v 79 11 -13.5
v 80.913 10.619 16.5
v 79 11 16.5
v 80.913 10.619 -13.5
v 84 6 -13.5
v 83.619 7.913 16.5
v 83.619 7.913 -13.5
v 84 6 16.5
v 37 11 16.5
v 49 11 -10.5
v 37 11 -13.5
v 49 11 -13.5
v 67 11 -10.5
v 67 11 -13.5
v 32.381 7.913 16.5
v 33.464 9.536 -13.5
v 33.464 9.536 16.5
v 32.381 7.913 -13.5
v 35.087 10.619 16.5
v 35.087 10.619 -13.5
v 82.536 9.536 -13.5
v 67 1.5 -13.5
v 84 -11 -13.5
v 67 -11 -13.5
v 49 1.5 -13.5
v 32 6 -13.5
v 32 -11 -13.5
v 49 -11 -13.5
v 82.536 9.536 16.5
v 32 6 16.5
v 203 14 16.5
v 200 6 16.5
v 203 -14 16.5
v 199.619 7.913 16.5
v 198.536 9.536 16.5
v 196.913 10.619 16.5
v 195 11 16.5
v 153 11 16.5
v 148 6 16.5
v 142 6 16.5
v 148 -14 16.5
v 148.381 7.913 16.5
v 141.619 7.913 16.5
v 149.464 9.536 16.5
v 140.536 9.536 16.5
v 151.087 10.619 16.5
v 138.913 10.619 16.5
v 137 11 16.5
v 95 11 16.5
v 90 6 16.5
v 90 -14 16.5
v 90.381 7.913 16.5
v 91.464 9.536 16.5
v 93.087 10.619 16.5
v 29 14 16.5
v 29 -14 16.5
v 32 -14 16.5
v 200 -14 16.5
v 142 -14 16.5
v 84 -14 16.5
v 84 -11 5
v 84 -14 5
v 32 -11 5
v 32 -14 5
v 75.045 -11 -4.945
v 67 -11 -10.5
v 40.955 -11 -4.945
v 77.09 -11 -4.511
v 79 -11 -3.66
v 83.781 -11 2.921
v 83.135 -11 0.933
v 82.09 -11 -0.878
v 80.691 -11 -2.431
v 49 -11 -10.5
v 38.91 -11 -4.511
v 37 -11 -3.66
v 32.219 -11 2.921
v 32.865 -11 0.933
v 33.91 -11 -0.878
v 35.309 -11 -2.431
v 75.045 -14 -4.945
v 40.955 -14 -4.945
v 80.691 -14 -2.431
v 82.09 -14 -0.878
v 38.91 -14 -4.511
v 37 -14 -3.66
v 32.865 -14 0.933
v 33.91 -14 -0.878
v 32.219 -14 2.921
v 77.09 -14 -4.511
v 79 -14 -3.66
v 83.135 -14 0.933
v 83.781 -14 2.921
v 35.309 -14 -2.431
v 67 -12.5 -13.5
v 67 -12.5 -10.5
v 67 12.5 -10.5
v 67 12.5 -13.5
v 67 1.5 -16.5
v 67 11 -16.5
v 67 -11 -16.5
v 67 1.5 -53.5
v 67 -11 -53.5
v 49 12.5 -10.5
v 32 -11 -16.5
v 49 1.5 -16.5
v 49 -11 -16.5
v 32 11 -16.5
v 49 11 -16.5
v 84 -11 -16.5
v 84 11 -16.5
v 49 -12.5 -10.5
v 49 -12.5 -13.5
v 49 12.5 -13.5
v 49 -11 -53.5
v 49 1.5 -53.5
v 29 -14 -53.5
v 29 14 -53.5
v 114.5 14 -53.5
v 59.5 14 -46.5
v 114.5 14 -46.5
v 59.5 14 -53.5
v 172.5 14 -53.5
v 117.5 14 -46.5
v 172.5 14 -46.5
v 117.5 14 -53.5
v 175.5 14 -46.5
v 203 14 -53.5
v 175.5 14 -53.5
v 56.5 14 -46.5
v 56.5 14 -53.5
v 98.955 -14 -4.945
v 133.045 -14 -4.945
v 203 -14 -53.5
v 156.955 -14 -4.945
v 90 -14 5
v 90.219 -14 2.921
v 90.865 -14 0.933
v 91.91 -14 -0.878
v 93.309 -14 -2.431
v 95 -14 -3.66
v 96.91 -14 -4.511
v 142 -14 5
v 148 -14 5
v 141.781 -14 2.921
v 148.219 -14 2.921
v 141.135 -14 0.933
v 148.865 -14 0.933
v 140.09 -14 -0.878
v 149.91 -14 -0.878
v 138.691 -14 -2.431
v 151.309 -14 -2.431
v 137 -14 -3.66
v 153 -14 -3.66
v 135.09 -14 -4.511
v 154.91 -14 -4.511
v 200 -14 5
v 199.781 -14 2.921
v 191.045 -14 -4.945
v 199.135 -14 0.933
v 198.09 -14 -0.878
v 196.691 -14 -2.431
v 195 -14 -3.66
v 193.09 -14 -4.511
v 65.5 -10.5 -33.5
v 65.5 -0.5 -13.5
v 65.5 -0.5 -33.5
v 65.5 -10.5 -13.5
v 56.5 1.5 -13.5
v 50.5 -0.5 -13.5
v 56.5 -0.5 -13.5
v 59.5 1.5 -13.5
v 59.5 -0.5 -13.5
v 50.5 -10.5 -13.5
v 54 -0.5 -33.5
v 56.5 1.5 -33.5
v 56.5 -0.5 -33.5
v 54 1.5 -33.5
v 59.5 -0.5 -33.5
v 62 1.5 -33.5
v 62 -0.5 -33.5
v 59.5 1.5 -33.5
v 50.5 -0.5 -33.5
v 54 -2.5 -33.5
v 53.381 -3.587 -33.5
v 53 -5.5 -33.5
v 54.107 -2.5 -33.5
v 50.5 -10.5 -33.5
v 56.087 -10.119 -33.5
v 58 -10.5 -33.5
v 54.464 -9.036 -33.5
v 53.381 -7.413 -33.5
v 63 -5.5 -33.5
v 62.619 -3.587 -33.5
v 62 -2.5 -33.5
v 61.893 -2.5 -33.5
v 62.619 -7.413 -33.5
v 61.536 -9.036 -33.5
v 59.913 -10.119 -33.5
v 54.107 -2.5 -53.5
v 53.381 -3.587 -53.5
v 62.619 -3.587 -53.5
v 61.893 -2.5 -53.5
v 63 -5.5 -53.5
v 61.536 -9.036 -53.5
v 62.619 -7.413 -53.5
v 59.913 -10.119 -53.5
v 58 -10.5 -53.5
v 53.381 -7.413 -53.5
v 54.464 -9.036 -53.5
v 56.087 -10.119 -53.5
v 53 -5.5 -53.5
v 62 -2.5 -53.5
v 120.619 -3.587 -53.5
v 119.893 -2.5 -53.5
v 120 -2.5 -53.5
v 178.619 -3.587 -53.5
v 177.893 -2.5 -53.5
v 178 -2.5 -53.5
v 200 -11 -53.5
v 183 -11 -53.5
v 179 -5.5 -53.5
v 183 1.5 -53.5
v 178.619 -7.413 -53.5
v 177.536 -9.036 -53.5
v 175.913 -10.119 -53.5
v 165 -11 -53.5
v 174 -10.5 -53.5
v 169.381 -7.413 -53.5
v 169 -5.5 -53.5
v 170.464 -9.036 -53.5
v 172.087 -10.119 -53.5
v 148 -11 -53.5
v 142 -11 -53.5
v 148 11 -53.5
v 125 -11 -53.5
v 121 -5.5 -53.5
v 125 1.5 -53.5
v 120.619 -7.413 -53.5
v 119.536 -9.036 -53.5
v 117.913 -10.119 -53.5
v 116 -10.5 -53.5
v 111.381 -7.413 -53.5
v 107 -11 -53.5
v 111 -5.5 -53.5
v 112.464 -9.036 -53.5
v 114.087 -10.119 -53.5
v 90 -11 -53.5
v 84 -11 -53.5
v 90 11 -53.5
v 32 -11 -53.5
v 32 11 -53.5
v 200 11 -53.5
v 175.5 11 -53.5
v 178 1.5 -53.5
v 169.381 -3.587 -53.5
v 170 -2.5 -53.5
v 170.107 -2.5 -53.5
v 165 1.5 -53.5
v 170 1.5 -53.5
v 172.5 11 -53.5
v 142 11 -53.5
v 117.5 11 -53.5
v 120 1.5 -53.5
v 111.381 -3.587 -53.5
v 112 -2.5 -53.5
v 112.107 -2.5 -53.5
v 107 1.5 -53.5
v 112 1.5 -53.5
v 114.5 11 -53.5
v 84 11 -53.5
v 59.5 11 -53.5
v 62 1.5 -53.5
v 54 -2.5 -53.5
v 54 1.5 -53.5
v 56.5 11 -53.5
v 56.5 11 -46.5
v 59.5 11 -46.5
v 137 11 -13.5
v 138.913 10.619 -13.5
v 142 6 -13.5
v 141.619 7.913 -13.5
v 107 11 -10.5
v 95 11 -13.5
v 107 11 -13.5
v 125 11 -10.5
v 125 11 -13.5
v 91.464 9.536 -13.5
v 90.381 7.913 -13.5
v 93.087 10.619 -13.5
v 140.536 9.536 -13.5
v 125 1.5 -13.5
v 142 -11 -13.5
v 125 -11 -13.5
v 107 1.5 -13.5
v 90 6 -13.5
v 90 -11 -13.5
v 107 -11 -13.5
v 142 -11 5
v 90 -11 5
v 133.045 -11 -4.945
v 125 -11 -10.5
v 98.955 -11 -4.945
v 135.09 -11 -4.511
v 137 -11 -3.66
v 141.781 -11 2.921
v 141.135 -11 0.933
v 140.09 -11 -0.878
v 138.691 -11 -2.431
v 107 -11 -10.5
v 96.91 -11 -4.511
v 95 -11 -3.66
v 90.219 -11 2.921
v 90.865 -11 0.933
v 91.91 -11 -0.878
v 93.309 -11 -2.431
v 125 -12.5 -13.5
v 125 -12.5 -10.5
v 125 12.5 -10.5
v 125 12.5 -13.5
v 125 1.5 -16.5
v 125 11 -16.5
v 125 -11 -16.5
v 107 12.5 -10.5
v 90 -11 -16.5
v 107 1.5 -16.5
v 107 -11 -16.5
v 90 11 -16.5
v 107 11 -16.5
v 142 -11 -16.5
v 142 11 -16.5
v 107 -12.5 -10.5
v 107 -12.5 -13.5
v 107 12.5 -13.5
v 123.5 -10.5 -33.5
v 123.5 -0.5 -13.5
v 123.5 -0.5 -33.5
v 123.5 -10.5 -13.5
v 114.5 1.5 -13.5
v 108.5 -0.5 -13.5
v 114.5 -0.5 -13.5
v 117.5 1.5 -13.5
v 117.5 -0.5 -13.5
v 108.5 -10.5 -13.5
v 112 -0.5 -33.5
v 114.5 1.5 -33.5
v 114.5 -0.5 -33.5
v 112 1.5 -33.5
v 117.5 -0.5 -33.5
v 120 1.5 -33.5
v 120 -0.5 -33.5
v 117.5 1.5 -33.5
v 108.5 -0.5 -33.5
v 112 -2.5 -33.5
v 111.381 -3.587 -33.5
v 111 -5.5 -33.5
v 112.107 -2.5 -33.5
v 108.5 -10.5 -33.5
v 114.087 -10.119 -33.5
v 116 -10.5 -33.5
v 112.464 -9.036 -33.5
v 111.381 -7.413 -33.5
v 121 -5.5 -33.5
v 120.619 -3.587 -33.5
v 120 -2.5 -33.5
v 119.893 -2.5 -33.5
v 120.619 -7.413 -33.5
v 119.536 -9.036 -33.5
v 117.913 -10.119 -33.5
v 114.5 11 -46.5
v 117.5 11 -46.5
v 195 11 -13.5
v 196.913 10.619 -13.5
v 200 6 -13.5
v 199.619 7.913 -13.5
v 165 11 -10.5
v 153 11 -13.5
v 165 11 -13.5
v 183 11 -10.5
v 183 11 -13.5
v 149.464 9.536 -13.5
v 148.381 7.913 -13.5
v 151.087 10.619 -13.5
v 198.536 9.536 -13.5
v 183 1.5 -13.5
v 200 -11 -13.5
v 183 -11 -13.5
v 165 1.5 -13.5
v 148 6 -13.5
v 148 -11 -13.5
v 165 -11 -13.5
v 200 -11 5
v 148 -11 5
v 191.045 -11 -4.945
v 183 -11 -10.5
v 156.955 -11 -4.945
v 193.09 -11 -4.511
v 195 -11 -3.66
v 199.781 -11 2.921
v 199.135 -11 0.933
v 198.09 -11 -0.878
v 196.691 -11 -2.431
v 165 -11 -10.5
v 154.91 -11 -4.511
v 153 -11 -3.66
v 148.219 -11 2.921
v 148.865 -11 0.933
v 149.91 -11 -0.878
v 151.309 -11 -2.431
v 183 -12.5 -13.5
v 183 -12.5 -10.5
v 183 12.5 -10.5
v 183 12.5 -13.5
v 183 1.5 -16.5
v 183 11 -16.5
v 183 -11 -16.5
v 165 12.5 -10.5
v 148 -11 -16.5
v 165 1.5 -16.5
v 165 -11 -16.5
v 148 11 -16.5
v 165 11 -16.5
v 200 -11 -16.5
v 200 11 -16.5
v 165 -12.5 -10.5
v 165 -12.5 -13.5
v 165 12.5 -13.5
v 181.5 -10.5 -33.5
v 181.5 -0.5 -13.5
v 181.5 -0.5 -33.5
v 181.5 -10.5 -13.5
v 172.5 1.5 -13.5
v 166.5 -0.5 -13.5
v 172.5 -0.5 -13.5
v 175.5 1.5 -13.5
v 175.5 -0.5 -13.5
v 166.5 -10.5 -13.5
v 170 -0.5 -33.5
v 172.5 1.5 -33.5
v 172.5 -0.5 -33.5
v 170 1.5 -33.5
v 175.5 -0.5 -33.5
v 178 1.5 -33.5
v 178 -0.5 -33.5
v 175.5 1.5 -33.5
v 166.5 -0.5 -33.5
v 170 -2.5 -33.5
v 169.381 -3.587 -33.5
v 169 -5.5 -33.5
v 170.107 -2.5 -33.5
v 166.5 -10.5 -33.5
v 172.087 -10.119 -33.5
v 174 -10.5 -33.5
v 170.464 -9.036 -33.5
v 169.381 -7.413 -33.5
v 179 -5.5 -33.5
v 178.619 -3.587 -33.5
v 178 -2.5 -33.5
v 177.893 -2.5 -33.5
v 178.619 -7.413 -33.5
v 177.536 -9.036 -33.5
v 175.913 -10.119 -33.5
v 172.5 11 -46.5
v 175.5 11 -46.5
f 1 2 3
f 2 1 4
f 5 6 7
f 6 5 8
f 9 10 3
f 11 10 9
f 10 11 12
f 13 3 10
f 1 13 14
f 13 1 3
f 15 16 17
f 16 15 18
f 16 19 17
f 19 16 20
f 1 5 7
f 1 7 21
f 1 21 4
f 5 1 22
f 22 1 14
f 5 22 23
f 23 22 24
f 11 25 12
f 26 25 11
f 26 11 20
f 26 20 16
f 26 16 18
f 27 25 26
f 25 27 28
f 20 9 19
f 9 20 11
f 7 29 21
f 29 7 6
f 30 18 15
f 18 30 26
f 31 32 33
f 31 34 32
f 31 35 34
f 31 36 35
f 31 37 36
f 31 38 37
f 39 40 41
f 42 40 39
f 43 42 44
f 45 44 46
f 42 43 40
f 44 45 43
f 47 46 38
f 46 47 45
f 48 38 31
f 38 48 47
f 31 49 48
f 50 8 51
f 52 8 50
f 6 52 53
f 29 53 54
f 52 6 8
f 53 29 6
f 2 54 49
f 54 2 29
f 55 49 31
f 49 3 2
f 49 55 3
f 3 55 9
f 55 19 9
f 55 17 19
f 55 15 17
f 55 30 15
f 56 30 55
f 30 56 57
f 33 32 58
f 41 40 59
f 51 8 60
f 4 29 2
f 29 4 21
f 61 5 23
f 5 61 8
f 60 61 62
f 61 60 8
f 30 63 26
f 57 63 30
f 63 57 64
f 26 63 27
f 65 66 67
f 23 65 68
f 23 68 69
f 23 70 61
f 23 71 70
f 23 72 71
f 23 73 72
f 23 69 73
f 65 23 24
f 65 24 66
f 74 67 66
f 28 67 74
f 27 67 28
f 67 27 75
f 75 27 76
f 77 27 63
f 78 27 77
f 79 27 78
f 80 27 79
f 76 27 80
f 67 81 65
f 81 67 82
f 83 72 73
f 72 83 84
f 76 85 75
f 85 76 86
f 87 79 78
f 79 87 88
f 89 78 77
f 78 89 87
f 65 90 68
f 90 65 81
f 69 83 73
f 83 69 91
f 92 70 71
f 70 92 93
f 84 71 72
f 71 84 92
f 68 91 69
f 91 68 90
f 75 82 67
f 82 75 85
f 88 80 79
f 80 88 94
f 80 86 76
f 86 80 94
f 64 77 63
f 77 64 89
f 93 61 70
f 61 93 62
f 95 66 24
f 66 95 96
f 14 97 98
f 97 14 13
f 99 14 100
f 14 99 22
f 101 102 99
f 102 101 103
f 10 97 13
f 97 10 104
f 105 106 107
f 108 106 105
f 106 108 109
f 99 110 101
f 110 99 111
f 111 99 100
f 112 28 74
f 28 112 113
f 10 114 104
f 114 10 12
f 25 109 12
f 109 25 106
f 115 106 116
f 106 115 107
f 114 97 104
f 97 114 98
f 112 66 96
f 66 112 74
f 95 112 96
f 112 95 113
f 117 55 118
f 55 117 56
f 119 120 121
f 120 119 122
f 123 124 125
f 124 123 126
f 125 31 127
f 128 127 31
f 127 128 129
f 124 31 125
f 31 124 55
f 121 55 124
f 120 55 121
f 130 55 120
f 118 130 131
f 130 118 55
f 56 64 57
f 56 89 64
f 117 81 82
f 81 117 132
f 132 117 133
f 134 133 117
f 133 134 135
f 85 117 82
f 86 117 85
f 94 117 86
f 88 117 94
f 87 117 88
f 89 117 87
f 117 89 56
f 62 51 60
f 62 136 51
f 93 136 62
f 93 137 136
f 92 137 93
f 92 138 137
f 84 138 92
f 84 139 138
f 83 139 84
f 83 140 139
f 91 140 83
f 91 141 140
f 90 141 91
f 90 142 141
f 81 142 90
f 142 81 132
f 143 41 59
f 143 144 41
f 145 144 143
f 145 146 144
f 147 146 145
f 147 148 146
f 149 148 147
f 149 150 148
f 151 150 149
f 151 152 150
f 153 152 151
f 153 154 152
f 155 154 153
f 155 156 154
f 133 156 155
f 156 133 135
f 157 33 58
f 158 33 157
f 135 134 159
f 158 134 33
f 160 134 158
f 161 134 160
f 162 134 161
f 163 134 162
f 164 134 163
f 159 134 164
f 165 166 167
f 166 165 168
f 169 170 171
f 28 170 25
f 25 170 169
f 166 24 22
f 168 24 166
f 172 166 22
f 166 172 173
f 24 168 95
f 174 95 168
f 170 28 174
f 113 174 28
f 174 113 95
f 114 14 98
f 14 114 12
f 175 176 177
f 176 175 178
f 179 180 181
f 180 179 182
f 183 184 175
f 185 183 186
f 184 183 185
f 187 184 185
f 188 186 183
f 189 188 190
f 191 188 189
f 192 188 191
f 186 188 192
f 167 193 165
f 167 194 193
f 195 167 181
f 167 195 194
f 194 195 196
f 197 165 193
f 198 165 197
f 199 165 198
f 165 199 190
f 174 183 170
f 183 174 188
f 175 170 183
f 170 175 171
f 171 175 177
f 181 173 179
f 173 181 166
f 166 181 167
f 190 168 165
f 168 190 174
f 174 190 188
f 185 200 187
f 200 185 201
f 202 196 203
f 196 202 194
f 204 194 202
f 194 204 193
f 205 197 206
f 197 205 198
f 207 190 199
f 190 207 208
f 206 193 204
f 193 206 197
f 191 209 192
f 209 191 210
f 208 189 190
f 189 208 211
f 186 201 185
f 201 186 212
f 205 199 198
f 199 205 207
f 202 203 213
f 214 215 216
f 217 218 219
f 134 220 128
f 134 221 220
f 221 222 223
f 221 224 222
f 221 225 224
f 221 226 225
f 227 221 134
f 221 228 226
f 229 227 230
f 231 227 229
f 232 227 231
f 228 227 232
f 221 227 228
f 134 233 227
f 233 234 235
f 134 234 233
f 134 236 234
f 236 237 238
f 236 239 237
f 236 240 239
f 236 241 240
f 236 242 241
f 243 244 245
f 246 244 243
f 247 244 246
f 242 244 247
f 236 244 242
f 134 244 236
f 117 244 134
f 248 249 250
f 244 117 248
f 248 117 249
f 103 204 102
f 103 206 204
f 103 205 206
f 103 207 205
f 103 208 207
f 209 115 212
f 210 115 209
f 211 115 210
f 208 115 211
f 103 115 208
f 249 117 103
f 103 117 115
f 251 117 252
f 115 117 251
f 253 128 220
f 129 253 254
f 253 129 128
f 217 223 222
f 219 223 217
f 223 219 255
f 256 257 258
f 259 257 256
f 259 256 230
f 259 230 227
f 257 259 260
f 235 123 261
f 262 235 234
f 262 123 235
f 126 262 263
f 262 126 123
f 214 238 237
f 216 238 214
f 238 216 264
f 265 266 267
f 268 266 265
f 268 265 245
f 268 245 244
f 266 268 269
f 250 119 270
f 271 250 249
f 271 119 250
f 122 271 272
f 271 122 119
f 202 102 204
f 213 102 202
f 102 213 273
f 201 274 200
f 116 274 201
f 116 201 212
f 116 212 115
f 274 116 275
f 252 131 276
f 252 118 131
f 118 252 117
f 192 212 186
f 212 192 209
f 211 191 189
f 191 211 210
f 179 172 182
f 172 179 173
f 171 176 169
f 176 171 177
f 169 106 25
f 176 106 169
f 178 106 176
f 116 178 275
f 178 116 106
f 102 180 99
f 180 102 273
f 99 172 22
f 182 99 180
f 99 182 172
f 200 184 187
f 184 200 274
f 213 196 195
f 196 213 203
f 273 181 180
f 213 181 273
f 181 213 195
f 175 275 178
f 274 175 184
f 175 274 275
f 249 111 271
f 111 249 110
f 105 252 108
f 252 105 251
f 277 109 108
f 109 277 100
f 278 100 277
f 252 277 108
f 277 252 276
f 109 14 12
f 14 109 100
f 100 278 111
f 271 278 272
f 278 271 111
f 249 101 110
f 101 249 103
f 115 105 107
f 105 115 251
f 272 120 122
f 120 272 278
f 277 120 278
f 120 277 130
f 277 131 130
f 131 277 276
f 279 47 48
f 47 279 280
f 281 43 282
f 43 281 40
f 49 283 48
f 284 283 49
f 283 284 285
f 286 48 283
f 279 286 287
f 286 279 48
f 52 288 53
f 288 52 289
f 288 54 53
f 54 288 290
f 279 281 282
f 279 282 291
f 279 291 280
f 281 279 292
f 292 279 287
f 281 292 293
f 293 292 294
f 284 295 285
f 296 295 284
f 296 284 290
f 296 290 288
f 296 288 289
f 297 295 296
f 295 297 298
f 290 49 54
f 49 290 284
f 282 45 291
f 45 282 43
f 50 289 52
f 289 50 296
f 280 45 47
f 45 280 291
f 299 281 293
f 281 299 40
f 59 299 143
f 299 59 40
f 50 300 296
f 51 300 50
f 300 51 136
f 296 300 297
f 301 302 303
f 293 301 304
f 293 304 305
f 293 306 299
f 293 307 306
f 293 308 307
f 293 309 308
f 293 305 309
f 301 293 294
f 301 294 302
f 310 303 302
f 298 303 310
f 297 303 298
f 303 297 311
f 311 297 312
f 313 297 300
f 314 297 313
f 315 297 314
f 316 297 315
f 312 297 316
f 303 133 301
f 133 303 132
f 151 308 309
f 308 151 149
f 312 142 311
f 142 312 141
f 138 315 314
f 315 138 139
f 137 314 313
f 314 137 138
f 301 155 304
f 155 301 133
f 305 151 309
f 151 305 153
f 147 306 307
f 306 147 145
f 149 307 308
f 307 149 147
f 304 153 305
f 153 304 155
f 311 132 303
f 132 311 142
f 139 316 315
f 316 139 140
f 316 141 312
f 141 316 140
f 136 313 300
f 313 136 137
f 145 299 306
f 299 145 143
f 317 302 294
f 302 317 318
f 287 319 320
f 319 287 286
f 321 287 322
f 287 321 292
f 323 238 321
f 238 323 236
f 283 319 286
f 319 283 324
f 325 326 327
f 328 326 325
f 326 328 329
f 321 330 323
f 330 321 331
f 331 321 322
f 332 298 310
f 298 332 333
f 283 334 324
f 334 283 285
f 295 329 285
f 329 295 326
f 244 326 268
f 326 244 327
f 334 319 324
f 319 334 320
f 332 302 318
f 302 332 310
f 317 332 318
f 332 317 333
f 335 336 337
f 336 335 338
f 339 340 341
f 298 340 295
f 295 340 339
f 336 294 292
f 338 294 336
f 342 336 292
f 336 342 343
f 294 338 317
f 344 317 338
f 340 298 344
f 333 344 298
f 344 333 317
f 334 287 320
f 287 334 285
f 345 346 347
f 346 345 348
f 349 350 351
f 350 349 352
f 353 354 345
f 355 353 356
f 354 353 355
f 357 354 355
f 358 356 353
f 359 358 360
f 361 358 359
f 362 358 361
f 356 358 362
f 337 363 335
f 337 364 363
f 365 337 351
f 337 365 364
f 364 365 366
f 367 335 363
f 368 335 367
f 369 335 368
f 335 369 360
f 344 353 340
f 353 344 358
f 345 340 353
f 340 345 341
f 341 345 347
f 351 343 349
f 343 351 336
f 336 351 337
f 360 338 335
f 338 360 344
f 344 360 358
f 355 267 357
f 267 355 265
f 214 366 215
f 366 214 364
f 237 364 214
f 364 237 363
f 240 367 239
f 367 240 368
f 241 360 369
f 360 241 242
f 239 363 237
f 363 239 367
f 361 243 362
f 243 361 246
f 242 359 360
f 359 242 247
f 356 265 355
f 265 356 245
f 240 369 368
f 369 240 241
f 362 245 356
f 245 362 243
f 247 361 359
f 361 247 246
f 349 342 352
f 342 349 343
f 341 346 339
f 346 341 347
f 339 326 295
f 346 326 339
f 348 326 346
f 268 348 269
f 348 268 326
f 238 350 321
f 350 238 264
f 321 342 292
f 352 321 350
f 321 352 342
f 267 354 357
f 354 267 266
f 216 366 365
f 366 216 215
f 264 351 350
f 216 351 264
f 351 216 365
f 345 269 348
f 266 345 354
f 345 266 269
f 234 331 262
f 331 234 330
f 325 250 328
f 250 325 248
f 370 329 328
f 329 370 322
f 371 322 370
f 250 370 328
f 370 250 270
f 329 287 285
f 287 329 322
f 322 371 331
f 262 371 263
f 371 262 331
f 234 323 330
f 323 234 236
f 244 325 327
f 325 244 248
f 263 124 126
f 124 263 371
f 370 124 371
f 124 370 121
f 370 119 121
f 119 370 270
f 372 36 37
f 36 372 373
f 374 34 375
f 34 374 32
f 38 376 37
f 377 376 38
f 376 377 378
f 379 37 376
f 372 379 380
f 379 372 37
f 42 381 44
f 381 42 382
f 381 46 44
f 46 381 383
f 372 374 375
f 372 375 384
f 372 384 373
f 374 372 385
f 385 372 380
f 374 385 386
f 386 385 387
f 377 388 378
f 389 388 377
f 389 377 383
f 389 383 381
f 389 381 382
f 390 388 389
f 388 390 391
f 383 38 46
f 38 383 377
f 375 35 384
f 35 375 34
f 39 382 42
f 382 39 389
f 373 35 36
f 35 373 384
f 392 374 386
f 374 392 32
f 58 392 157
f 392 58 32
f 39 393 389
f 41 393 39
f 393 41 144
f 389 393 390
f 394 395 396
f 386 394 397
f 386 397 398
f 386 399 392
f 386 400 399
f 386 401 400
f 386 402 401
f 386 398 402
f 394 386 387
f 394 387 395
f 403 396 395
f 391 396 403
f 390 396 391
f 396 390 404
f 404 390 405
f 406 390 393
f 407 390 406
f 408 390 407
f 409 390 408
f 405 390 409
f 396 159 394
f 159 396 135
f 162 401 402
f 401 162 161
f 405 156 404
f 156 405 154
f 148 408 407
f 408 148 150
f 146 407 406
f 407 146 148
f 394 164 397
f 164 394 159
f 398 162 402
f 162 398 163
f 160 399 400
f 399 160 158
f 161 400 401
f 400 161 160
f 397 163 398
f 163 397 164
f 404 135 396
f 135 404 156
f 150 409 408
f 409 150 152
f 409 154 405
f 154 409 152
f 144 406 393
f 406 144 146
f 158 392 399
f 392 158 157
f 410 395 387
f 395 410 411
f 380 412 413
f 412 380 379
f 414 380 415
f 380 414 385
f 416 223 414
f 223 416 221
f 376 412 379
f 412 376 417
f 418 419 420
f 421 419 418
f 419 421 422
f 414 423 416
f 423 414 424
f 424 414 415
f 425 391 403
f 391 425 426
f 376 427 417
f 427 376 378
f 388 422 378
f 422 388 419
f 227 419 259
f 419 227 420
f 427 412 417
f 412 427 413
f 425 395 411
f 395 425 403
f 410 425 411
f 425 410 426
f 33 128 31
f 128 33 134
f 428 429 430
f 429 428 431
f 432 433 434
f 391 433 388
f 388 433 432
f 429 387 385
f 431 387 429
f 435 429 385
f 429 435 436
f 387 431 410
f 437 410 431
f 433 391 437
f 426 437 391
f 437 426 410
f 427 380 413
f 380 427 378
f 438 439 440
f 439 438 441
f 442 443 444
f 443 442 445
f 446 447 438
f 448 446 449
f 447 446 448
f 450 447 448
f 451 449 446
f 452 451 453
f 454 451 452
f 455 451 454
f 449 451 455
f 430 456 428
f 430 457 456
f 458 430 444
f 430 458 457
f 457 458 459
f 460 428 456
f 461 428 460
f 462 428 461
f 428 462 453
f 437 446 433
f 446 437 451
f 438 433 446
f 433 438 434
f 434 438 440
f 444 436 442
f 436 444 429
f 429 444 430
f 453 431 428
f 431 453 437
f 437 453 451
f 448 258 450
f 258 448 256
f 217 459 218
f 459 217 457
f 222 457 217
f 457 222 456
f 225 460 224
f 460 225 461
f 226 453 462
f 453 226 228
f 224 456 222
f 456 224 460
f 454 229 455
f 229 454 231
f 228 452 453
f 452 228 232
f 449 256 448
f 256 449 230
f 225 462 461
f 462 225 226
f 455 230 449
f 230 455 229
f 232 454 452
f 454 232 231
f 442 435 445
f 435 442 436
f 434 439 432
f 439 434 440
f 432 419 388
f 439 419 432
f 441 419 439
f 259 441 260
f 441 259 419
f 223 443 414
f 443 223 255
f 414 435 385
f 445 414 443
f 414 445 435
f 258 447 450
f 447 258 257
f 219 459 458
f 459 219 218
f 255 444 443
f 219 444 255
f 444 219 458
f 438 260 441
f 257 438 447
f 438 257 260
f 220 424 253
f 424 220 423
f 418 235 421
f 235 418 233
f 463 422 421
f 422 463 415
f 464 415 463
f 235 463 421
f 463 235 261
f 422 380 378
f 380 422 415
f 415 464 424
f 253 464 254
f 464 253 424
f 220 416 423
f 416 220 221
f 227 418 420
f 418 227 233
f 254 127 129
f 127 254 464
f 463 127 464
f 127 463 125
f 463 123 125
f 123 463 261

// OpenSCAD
number_of_handsets = 3;
handset_width = 52;  // default: 52
handset_depth = 22;  // default: 22
cradle_depth = 30;   // default: 30

wall_thickness = 3;

for(i=[1:number_of_handsets]) {
    translate([i*(handset_width+wall_thickness*2),0,0]) handset(i);
}

module handset() {
    handset_cradle();
    powersupply_support();
    cradle_base();
}

module handset_cradle(i) {
    
    difference() {
        union() {
            cube([handset_width+wall_thickness*2, handset_depth+wall_thickness*2, cradle_depth+wall_thickness], center=true);
        }
        union() {
            // rounded fillet of the backside of the cradle.
            hull() {
                translate([-handset_width/2+5,handset_depth/2-5,wall_thickness/2]) 
                        cylinder(r=5,h=cradle_depth, center=true);
                translate([handset_width/2-5,handset_depth/2-5,wall_thickness/2]) 
                        cylinder(r=5,h=cradle_depth, center=true);
            }
            translate([0,-2.5,wall_thickness/2]) cube([handset_width, handset_depth-5, cradle_depth], center=true);
            hull() {
                // 20mm lip at the bottom is not parameterized, nor is the 10mm radius of the knockout.
                rotate([90,0,0]) translate([-handset_width/2+10,-cradle_depth/2+20,handset_depth/2]) 
                        cylinder(r=10,h=handset_depth, center=true);
                rotate([90,0,0]) translate([handset_width/2-10,-cradle_depth/2+20,handset_depth/2]) 
                        cylinder(r=10,h=handset_depth, center=true);
            }
            translate([0,-handset_depth/2,20]) 
                        cube([handset_width,handset_depth,cradle_depth],center=true);
            translate([0,  5.5, -((cradle_depth+wall_thickness)/2)+wall_thickness]) cube([18,14,wall_thickness*2], center=true);
            translate([0, -5.5, -((cradle_depth+wall_thickness)/2)+wall_thickness]) cube([18,14,wall_thickness*2], center=true);
        }
    }
}

module powersupply_support(i) {
    difference() {
        union(){
            translate([0,-5.5,-20-((cradle_depth+wall_thickness)/2)+wall_thickness]) cube([18,14,40], center=true);
        }
        union() {
            translate([0, -5.5, -10-((cradle_depth+wall_thickness)/2)+wall_thickness]) cube([15,10,20], center=true);
            translate([0, -5.5, -20-((cradle_depth+wall_thickness)/2)+wall_thickness]) cylinder(r=5,h=40, center=true);
            translate([0, -5.5+5, -20-((cradle_depth+wall_thickness)/2)+wall_thickness]) cube([3,4,40],   center=true);
            translate([0, -5.5+5, -30-((cradle_depth+wall_thickness)/2)+wall_thickness]) cube([8,4,20],   center=true);
        }
    }
}

module cradle_base(i) {
    difference() {
        union() {
            translate([0,0,-20-((cradle_depth+wall_thickness)/2)+wall_thickness]) cube([handset_width+wall_thickness*2, handset_depth+wall_thickness*2, 40], center=true);
        }
        union() {
            translate([0,0,-20-((cradle_depth+wall_thickness)/2)+wall_thickness]) cube([handset_width, handset_depth, 40], center=true);
            translate([0,(handset_depth+wall_thickness*2)/2,-(cradle_depth+wall_thickness)/2-35]) cube([3,wall_thickness*2,10],center=true);
        }
    }
} 
